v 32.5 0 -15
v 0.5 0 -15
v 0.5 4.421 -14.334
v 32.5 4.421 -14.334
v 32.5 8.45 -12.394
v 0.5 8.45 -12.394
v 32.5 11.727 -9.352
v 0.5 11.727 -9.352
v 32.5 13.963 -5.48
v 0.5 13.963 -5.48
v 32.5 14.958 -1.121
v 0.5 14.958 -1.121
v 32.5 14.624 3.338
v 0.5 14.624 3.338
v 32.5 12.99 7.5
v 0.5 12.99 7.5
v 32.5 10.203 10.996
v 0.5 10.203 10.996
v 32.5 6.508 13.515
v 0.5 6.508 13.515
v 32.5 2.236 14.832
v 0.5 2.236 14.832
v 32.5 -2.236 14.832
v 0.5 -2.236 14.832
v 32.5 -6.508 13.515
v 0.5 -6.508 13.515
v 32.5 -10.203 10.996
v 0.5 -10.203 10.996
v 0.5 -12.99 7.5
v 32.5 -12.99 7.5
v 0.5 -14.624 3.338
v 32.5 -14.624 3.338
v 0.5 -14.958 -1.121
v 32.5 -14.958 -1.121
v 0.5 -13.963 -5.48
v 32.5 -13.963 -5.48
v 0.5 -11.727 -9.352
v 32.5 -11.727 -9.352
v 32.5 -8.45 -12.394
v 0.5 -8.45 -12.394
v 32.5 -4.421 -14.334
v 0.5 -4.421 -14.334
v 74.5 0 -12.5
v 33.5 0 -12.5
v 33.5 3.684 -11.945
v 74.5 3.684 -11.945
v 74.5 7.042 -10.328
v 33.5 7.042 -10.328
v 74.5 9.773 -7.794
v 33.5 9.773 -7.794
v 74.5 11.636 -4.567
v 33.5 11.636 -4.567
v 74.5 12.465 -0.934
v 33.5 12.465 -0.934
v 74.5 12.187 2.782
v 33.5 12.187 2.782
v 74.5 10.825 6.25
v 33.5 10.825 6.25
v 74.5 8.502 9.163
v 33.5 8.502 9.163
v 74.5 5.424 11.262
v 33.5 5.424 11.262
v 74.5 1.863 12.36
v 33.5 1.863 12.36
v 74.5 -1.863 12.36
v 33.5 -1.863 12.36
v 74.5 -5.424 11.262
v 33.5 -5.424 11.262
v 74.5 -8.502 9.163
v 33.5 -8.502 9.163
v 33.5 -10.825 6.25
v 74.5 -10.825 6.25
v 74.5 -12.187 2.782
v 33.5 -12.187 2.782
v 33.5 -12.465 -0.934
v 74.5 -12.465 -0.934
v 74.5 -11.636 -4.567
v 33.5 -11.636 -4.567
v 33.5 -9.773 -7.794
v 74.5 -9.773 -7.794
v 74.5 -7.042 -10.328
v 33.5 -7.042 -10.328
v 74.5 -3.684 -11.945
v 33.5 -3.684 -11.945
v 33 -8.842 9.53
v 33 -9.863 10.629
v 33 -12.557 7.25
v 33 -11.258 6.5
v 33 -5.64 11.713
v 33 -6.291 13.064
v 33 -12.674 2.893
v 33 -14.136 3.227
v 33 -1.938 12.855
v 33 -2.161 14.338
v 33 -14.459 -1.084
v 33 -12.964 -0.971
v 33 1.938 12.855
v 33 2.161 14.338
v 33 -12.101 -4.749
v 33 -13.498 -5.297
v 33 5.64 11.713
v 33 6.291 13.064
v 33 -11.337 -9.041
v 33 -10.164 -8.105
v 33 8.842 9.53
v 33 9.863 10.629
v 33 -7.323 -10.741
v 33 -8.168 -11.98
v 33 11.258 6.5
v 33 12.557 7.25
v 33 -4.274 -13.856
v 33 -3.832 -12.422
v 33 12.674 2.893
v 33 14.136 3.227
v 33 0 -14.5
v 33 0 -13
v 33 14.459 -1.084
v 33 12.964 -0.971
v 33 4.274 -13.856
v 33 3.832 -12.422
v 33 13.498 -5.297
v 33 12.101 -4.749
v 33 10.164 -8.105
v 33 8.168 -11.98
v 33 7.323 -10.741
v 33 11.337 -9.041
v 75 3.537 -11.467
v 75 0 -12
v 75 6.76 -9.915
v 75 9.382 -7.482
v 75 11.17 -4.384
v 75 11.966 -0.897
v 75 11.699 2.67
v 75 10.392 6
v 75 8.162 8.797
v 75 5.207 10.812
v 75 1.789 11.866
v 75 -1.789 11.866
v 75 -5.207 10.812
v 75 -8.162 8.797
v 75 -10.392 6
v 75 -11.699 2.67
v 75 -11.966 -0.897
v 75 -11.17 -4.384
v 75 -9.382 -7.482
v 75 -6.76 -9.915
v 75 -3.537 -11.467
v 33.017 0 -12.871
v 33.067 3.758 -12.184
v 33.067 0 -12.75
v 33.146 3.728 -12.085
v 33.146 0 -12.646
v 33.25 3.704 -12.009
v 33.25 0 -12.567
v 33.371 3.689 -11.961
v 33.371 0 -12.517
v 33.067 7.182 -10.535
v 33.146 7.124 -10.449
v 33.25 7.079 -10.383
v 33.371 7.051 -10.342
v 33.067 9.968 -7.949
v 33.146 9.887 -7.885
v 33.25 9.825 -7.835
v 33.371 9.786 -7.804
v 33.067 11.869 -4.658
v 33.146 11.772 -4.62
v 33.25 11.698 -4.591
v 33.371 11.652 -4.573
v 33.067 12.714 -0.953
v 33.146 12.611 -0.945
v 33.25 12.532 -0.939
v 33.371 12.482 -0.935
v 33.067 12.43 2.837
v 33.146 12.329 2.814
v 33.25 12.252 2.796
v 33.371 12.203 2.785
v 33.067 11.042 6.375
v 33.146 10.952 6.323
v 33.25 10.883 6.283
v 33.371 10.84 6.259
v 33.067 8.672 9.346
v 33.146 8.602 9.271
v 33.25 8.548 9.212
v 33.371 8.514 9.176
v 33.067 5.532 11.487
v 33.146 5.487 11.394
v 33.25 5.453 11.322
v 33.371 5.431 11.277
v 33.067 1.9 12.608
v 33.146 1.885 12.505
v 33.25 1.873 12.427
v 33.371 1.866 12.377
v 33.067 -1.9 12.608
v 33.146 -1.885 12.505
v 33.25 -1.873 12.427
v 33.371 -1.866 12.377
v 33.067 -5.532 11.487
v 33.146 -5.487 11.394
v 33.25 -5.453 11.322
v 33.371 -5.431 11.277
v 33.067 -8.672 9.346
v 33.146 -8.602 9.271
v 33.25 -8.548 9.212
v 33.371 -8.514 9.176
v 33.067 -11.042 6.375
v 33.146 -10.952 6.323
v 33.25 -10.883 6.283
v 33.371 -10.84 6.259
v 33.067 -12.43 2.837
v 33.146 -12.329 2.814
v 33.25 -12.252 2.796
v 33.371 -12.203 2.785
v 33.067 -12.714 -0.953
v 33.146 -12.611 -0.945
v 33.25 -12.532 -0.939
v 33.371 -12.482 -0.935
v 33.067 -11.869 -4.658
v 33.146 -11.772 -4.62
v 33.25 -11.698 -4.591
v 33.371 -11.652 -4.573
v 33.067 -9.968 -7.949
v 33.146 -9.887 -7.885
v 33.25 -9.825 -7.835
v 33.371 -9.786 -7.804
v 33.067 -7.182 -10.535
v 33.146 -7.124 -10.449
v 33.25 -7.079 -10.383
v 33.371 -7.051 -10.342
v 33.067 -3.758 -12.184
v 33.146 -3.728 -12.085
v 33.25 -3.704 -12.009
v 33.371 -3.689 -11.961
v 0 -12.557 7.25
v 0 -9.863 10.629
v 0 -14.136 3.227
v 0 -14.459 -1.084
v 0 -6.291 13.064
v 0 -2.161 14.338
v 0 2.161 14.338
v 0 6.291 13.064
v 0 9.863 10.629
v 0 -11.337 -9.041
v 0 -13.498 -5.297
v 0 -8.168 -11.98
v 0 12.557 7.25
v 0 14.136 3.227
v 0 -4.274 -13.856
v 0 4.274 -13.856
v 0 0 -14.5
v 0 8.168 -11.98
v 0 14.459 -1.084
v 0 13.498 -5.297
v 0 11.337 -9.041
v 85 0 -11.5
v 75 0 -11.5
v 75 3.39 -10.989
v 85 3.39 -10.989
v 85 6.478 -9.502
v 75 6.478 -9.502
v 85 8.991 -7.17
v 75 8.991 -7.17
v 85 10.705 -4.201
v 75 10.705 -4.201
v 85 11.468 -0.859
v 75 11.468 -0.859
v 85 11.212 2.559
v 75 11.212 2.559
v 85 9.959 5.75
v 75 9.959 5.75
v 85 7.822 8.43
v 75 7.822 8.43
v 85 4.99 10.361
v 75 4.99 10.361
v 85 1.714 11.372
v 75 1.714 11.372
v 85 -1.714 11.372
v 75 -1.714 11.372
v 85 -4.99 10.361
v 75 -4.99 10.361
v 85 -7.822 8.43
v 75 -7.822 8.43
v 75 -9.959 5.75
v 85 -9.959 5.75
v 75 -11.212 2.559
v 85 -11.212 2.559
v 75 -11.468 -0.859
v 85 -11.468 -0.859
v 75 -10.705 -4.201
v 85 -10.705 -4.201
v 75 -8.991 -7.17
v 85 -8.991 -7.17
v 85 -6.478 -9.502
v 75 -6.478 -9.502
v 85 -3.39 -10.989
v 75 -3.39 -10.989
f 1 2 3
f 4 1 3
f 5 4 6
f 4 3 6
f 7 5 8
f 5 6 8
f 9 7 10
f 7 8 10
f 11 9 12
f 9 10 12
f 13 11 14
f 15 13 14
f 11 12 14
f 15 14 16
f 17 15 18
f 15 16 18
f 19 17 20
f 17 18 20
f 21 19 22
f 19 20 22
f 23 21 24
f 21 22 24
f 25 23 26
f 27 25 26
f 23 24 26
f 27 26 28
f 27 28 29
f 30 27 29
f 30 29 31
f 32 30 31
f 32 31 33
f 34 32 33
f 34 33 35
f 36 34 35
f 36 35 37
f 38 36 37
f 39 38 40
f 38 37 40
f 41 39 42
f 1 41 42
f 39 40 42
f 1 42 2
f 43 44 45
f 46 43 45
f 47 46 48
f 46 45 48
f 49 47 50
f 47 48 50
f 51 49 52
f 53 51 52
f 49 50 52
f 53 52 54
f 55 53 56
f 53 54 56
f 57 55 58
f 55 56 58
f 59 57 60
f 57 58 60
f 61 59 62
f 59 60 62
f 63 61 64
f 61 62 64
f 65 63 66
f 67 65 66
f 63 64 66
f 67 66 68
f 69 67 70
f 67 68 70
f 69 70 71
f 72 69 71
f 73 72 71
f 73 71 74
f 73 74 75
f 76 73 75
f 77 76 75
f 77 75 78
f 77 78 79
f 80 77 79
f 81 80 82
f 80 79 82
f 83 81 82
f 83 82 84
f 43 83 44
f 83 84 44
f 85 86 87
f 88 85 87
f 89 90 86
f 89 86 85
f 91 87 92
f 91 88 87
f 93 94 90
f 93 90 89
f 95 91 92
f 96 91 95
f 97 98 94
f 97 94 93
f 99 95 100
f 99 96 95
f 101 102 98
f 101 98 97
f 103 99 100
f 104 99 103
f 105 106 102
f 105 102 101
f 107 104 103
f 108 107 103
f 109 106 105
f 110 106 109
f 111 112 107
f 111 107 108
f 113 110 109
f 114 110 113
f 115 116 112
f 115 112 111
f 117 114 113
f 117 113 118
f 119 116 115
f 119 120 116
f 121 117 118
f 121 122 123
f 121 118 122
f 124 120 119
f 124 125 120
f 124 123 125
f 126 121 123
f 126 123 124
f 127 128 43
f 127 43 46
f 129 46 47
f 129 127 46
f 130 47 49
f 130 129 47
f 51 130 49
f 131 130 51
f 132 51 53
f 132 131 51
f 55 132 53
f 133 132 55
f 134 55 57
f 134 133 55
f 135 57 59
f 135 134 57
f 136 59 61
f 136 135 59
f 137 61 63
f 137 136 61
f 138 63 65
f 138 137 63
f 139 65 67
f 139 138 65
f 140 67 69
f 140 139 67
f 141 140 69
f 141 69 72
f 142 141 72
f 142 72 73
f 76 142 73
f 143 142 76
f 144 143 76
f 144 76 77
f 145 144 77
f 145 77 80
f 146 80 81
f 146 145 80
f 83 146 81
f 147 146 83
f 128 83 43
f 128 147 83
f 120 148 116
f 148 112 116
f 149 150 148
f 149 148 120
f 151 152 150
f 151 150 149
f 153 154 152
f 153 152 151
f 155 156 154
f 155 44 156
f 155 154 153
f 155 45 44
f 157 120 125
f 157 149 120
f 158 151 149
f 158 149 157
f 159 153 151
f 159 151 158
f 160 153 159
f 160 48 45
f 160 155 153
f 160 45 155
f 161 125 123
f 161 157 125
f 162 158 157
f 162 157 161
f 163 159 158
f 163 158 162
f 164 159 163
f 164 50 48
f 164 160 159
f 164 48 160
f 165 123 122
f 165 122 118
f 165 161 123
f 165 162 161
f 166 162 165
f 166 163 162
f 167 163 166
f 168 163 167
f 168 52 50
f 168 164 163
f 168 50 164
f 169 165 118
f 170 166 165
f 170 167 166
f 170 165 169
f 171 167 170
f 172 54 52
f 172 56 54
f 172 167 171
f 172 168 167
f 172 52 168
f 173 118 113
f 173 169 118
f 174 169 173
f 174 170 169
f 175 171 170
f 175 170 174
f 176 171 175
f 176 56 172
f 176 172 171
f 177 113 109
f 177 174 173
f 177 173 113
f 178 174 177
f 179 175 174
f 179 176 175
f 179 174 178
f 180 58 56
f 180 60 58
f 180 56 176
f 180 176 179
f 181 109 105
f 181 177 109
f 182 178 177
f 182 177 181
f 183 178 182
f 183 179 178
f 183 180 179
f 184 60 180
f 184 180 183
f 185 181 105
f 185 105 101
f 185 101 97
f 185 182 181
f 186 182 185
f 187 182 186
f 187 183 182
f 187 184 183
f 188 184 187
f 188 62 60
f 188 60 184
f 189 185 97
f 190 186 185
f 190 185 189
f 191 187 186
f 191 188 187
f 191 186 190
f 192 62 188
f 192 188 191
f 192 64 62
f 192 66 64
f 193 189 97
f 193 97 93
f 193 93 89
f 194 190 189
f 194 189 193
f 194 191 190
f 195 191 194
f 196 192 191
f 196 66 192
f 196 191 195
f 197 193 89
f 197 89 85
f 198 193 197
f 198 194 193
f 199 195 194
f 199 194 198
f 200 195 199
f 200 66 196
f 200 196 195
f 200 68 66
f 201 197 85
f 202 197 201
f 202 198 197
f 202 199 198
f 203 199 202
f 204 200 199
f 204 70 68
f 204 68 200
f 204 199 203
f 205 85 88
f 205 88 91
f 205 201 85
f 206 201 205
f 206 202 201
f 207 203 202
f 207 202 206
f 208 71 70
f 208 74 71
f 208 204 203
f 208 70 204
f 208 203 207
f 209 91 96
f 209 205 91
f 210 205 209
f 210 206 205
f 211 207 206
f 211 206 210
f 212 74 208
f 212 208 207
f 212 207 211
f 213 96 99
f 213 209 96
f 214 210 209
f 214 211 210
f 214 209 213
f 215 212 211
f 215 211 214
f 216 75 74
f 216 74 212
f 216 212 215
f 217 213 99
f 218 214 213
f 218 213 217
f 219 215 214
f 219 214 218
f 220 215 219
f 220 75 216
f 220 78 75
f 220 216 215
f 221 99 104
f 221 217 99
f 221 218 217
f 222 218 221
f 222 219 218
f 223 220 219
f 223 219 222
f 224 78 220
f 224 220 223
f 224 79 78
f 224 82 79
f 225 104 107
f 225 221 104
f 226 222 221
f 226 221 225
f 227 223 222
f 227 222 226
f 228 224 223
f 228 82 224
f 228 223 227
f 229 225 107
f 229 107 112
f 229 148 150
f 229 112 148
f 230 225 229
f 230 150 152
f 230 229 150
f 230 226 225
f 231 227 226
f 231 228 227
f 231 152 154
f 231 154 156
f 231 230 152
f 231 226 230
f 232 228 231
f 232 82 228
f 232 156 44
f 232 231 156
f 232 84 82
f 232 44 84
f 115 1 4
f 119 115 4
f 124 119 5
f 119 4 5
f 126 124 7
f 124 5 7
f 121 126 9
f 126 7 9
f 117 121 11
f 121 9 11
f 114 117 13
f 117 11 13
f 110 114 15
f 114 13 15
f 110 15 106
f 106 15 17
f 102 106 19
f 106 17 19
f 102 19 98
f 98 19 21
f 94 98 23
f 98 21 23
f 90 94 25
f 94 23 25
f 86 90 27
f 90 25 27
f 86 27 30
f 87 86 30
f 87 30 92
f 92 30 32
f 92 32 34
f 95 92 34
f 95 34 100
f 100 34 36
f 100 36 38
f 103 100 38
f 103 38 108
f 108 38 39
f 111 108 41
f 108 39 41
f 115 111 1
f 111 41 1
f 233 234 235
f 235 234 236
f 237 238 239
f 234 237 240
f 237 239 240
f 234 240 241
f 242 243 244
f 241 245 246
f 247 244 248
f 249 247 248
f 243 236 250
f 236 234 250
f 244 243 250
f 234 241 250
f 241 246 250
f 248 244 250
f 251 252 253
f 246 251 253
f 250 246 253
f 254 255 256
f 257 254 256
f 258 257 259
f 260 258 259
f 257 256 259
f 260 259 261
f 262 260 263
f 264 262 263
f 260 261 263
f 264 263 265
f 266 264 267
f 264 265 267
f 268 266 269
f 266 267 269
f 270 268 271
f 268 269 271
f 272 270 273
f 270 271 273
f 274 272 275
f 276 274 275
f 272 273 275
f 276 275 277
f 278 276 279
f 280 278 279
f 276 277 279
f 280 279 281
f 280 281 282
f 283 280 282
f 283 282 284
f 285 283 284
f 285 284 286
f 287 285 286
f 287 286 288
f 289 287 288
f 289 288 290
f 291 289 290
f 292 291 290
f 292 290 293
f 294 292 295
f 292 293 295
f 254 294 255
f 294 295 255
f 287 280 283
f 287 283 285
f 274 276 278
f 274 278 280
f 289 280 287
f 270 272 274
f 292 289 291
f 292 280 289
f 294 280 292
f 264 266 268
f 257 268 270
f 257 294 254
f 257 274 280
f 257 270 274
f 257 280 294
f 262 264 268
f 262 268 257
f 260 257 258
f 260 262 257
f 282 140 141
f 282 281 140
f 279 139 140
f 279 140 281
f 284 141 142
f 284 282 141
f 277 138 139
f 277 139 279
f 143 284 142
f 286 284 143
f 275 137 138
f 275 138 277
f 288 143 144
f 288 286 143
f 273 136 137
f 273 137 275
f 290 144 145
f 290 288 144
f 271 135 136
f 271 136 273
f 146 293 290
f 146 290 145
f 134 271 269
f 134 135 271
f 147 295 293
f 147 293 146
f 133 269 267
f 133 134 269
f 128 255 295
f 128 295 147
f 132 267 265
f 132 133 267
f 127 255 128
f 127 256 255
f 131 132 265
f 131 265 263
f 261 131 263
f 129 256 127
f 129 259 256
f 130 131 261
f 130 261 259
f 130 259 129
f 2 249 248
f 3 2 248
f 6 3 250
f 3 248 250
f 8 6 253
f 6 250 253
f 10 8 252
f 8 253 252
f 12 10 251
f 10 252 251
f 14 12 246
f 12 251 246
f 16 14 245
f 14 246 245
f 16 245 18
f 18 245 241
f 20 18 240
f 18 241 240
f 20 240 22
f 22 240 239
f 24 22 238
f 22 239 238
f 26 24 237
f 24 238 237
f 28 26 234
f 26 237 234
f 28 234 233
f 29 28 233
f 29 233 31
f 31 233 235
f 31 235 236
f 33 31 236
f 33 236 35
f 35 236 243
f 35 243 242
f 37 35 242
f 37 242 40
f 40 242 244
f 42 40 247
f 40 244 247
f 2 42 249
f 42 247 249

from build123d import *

# Parameters (mm, degrees)
SKETCH_1_R      = 15
EXTRUDE_1_DEPTH = 33
SKETCH_2_R      = 12.5
EXTRUDE_2_DEPTH = 42
FILLET_1_R      = 0.5
CHAMFER_1_SIZE  = 0.5
SKETCH_3_R      = 11.5
EXTRUDE_3_DEPTH = 10


with BuildPart() as part:
    # 草图1 → 凸台-拉伸1 (new body)
    with BuildSketch(Plane(origin=(0, 0, 0), x_dir=(0, 0, -1), z_dir=(1, 0, 0))):
        Circle(SKETCH_1_R)
    extrude(amount=EXTRUDE_1_DEPTH)

    # 草图2 → 凸台-拉伸2 (add)
    with BuildSketch(Plane(origin=(33, 0, 0), x_dir=(0, 0, -1), z_dir=(1, 0, 0))):
        Circle(SKETCH_2_R)
    extrude(amount=EXTRUDE_2_DEPTH)

    # 圆角1
    fillet_1_edges = [part.edges().sort_by_distance(p)[0] for p in [
        (33, 0, 12.5),
    ]]
    fillet(fillet_1_edges, radius=FILLET_1_R)

    # 倒角1
    chamfer_1_edges = [part.edges().sort_by_distance(p)[0] for p in [
        (0, 0, 15),
        (33, 0, 15),
        (75, 0, 12.5),
    ]]
    chamfer(chamfer_1_edges, length=CHAMFER_1_SIZE)

    # 草图3 → 凸台-拉伸3 (add)
    with BuildSketch(Plane(origin=(75, 0, 0), x_dir=(0, 0, -1), z_dir=(1, 0, 0))):
        Circle(SKETCH_3_R)
    extrude(amount=EXTRUDE_3_DEPTH)


solid = part.part
